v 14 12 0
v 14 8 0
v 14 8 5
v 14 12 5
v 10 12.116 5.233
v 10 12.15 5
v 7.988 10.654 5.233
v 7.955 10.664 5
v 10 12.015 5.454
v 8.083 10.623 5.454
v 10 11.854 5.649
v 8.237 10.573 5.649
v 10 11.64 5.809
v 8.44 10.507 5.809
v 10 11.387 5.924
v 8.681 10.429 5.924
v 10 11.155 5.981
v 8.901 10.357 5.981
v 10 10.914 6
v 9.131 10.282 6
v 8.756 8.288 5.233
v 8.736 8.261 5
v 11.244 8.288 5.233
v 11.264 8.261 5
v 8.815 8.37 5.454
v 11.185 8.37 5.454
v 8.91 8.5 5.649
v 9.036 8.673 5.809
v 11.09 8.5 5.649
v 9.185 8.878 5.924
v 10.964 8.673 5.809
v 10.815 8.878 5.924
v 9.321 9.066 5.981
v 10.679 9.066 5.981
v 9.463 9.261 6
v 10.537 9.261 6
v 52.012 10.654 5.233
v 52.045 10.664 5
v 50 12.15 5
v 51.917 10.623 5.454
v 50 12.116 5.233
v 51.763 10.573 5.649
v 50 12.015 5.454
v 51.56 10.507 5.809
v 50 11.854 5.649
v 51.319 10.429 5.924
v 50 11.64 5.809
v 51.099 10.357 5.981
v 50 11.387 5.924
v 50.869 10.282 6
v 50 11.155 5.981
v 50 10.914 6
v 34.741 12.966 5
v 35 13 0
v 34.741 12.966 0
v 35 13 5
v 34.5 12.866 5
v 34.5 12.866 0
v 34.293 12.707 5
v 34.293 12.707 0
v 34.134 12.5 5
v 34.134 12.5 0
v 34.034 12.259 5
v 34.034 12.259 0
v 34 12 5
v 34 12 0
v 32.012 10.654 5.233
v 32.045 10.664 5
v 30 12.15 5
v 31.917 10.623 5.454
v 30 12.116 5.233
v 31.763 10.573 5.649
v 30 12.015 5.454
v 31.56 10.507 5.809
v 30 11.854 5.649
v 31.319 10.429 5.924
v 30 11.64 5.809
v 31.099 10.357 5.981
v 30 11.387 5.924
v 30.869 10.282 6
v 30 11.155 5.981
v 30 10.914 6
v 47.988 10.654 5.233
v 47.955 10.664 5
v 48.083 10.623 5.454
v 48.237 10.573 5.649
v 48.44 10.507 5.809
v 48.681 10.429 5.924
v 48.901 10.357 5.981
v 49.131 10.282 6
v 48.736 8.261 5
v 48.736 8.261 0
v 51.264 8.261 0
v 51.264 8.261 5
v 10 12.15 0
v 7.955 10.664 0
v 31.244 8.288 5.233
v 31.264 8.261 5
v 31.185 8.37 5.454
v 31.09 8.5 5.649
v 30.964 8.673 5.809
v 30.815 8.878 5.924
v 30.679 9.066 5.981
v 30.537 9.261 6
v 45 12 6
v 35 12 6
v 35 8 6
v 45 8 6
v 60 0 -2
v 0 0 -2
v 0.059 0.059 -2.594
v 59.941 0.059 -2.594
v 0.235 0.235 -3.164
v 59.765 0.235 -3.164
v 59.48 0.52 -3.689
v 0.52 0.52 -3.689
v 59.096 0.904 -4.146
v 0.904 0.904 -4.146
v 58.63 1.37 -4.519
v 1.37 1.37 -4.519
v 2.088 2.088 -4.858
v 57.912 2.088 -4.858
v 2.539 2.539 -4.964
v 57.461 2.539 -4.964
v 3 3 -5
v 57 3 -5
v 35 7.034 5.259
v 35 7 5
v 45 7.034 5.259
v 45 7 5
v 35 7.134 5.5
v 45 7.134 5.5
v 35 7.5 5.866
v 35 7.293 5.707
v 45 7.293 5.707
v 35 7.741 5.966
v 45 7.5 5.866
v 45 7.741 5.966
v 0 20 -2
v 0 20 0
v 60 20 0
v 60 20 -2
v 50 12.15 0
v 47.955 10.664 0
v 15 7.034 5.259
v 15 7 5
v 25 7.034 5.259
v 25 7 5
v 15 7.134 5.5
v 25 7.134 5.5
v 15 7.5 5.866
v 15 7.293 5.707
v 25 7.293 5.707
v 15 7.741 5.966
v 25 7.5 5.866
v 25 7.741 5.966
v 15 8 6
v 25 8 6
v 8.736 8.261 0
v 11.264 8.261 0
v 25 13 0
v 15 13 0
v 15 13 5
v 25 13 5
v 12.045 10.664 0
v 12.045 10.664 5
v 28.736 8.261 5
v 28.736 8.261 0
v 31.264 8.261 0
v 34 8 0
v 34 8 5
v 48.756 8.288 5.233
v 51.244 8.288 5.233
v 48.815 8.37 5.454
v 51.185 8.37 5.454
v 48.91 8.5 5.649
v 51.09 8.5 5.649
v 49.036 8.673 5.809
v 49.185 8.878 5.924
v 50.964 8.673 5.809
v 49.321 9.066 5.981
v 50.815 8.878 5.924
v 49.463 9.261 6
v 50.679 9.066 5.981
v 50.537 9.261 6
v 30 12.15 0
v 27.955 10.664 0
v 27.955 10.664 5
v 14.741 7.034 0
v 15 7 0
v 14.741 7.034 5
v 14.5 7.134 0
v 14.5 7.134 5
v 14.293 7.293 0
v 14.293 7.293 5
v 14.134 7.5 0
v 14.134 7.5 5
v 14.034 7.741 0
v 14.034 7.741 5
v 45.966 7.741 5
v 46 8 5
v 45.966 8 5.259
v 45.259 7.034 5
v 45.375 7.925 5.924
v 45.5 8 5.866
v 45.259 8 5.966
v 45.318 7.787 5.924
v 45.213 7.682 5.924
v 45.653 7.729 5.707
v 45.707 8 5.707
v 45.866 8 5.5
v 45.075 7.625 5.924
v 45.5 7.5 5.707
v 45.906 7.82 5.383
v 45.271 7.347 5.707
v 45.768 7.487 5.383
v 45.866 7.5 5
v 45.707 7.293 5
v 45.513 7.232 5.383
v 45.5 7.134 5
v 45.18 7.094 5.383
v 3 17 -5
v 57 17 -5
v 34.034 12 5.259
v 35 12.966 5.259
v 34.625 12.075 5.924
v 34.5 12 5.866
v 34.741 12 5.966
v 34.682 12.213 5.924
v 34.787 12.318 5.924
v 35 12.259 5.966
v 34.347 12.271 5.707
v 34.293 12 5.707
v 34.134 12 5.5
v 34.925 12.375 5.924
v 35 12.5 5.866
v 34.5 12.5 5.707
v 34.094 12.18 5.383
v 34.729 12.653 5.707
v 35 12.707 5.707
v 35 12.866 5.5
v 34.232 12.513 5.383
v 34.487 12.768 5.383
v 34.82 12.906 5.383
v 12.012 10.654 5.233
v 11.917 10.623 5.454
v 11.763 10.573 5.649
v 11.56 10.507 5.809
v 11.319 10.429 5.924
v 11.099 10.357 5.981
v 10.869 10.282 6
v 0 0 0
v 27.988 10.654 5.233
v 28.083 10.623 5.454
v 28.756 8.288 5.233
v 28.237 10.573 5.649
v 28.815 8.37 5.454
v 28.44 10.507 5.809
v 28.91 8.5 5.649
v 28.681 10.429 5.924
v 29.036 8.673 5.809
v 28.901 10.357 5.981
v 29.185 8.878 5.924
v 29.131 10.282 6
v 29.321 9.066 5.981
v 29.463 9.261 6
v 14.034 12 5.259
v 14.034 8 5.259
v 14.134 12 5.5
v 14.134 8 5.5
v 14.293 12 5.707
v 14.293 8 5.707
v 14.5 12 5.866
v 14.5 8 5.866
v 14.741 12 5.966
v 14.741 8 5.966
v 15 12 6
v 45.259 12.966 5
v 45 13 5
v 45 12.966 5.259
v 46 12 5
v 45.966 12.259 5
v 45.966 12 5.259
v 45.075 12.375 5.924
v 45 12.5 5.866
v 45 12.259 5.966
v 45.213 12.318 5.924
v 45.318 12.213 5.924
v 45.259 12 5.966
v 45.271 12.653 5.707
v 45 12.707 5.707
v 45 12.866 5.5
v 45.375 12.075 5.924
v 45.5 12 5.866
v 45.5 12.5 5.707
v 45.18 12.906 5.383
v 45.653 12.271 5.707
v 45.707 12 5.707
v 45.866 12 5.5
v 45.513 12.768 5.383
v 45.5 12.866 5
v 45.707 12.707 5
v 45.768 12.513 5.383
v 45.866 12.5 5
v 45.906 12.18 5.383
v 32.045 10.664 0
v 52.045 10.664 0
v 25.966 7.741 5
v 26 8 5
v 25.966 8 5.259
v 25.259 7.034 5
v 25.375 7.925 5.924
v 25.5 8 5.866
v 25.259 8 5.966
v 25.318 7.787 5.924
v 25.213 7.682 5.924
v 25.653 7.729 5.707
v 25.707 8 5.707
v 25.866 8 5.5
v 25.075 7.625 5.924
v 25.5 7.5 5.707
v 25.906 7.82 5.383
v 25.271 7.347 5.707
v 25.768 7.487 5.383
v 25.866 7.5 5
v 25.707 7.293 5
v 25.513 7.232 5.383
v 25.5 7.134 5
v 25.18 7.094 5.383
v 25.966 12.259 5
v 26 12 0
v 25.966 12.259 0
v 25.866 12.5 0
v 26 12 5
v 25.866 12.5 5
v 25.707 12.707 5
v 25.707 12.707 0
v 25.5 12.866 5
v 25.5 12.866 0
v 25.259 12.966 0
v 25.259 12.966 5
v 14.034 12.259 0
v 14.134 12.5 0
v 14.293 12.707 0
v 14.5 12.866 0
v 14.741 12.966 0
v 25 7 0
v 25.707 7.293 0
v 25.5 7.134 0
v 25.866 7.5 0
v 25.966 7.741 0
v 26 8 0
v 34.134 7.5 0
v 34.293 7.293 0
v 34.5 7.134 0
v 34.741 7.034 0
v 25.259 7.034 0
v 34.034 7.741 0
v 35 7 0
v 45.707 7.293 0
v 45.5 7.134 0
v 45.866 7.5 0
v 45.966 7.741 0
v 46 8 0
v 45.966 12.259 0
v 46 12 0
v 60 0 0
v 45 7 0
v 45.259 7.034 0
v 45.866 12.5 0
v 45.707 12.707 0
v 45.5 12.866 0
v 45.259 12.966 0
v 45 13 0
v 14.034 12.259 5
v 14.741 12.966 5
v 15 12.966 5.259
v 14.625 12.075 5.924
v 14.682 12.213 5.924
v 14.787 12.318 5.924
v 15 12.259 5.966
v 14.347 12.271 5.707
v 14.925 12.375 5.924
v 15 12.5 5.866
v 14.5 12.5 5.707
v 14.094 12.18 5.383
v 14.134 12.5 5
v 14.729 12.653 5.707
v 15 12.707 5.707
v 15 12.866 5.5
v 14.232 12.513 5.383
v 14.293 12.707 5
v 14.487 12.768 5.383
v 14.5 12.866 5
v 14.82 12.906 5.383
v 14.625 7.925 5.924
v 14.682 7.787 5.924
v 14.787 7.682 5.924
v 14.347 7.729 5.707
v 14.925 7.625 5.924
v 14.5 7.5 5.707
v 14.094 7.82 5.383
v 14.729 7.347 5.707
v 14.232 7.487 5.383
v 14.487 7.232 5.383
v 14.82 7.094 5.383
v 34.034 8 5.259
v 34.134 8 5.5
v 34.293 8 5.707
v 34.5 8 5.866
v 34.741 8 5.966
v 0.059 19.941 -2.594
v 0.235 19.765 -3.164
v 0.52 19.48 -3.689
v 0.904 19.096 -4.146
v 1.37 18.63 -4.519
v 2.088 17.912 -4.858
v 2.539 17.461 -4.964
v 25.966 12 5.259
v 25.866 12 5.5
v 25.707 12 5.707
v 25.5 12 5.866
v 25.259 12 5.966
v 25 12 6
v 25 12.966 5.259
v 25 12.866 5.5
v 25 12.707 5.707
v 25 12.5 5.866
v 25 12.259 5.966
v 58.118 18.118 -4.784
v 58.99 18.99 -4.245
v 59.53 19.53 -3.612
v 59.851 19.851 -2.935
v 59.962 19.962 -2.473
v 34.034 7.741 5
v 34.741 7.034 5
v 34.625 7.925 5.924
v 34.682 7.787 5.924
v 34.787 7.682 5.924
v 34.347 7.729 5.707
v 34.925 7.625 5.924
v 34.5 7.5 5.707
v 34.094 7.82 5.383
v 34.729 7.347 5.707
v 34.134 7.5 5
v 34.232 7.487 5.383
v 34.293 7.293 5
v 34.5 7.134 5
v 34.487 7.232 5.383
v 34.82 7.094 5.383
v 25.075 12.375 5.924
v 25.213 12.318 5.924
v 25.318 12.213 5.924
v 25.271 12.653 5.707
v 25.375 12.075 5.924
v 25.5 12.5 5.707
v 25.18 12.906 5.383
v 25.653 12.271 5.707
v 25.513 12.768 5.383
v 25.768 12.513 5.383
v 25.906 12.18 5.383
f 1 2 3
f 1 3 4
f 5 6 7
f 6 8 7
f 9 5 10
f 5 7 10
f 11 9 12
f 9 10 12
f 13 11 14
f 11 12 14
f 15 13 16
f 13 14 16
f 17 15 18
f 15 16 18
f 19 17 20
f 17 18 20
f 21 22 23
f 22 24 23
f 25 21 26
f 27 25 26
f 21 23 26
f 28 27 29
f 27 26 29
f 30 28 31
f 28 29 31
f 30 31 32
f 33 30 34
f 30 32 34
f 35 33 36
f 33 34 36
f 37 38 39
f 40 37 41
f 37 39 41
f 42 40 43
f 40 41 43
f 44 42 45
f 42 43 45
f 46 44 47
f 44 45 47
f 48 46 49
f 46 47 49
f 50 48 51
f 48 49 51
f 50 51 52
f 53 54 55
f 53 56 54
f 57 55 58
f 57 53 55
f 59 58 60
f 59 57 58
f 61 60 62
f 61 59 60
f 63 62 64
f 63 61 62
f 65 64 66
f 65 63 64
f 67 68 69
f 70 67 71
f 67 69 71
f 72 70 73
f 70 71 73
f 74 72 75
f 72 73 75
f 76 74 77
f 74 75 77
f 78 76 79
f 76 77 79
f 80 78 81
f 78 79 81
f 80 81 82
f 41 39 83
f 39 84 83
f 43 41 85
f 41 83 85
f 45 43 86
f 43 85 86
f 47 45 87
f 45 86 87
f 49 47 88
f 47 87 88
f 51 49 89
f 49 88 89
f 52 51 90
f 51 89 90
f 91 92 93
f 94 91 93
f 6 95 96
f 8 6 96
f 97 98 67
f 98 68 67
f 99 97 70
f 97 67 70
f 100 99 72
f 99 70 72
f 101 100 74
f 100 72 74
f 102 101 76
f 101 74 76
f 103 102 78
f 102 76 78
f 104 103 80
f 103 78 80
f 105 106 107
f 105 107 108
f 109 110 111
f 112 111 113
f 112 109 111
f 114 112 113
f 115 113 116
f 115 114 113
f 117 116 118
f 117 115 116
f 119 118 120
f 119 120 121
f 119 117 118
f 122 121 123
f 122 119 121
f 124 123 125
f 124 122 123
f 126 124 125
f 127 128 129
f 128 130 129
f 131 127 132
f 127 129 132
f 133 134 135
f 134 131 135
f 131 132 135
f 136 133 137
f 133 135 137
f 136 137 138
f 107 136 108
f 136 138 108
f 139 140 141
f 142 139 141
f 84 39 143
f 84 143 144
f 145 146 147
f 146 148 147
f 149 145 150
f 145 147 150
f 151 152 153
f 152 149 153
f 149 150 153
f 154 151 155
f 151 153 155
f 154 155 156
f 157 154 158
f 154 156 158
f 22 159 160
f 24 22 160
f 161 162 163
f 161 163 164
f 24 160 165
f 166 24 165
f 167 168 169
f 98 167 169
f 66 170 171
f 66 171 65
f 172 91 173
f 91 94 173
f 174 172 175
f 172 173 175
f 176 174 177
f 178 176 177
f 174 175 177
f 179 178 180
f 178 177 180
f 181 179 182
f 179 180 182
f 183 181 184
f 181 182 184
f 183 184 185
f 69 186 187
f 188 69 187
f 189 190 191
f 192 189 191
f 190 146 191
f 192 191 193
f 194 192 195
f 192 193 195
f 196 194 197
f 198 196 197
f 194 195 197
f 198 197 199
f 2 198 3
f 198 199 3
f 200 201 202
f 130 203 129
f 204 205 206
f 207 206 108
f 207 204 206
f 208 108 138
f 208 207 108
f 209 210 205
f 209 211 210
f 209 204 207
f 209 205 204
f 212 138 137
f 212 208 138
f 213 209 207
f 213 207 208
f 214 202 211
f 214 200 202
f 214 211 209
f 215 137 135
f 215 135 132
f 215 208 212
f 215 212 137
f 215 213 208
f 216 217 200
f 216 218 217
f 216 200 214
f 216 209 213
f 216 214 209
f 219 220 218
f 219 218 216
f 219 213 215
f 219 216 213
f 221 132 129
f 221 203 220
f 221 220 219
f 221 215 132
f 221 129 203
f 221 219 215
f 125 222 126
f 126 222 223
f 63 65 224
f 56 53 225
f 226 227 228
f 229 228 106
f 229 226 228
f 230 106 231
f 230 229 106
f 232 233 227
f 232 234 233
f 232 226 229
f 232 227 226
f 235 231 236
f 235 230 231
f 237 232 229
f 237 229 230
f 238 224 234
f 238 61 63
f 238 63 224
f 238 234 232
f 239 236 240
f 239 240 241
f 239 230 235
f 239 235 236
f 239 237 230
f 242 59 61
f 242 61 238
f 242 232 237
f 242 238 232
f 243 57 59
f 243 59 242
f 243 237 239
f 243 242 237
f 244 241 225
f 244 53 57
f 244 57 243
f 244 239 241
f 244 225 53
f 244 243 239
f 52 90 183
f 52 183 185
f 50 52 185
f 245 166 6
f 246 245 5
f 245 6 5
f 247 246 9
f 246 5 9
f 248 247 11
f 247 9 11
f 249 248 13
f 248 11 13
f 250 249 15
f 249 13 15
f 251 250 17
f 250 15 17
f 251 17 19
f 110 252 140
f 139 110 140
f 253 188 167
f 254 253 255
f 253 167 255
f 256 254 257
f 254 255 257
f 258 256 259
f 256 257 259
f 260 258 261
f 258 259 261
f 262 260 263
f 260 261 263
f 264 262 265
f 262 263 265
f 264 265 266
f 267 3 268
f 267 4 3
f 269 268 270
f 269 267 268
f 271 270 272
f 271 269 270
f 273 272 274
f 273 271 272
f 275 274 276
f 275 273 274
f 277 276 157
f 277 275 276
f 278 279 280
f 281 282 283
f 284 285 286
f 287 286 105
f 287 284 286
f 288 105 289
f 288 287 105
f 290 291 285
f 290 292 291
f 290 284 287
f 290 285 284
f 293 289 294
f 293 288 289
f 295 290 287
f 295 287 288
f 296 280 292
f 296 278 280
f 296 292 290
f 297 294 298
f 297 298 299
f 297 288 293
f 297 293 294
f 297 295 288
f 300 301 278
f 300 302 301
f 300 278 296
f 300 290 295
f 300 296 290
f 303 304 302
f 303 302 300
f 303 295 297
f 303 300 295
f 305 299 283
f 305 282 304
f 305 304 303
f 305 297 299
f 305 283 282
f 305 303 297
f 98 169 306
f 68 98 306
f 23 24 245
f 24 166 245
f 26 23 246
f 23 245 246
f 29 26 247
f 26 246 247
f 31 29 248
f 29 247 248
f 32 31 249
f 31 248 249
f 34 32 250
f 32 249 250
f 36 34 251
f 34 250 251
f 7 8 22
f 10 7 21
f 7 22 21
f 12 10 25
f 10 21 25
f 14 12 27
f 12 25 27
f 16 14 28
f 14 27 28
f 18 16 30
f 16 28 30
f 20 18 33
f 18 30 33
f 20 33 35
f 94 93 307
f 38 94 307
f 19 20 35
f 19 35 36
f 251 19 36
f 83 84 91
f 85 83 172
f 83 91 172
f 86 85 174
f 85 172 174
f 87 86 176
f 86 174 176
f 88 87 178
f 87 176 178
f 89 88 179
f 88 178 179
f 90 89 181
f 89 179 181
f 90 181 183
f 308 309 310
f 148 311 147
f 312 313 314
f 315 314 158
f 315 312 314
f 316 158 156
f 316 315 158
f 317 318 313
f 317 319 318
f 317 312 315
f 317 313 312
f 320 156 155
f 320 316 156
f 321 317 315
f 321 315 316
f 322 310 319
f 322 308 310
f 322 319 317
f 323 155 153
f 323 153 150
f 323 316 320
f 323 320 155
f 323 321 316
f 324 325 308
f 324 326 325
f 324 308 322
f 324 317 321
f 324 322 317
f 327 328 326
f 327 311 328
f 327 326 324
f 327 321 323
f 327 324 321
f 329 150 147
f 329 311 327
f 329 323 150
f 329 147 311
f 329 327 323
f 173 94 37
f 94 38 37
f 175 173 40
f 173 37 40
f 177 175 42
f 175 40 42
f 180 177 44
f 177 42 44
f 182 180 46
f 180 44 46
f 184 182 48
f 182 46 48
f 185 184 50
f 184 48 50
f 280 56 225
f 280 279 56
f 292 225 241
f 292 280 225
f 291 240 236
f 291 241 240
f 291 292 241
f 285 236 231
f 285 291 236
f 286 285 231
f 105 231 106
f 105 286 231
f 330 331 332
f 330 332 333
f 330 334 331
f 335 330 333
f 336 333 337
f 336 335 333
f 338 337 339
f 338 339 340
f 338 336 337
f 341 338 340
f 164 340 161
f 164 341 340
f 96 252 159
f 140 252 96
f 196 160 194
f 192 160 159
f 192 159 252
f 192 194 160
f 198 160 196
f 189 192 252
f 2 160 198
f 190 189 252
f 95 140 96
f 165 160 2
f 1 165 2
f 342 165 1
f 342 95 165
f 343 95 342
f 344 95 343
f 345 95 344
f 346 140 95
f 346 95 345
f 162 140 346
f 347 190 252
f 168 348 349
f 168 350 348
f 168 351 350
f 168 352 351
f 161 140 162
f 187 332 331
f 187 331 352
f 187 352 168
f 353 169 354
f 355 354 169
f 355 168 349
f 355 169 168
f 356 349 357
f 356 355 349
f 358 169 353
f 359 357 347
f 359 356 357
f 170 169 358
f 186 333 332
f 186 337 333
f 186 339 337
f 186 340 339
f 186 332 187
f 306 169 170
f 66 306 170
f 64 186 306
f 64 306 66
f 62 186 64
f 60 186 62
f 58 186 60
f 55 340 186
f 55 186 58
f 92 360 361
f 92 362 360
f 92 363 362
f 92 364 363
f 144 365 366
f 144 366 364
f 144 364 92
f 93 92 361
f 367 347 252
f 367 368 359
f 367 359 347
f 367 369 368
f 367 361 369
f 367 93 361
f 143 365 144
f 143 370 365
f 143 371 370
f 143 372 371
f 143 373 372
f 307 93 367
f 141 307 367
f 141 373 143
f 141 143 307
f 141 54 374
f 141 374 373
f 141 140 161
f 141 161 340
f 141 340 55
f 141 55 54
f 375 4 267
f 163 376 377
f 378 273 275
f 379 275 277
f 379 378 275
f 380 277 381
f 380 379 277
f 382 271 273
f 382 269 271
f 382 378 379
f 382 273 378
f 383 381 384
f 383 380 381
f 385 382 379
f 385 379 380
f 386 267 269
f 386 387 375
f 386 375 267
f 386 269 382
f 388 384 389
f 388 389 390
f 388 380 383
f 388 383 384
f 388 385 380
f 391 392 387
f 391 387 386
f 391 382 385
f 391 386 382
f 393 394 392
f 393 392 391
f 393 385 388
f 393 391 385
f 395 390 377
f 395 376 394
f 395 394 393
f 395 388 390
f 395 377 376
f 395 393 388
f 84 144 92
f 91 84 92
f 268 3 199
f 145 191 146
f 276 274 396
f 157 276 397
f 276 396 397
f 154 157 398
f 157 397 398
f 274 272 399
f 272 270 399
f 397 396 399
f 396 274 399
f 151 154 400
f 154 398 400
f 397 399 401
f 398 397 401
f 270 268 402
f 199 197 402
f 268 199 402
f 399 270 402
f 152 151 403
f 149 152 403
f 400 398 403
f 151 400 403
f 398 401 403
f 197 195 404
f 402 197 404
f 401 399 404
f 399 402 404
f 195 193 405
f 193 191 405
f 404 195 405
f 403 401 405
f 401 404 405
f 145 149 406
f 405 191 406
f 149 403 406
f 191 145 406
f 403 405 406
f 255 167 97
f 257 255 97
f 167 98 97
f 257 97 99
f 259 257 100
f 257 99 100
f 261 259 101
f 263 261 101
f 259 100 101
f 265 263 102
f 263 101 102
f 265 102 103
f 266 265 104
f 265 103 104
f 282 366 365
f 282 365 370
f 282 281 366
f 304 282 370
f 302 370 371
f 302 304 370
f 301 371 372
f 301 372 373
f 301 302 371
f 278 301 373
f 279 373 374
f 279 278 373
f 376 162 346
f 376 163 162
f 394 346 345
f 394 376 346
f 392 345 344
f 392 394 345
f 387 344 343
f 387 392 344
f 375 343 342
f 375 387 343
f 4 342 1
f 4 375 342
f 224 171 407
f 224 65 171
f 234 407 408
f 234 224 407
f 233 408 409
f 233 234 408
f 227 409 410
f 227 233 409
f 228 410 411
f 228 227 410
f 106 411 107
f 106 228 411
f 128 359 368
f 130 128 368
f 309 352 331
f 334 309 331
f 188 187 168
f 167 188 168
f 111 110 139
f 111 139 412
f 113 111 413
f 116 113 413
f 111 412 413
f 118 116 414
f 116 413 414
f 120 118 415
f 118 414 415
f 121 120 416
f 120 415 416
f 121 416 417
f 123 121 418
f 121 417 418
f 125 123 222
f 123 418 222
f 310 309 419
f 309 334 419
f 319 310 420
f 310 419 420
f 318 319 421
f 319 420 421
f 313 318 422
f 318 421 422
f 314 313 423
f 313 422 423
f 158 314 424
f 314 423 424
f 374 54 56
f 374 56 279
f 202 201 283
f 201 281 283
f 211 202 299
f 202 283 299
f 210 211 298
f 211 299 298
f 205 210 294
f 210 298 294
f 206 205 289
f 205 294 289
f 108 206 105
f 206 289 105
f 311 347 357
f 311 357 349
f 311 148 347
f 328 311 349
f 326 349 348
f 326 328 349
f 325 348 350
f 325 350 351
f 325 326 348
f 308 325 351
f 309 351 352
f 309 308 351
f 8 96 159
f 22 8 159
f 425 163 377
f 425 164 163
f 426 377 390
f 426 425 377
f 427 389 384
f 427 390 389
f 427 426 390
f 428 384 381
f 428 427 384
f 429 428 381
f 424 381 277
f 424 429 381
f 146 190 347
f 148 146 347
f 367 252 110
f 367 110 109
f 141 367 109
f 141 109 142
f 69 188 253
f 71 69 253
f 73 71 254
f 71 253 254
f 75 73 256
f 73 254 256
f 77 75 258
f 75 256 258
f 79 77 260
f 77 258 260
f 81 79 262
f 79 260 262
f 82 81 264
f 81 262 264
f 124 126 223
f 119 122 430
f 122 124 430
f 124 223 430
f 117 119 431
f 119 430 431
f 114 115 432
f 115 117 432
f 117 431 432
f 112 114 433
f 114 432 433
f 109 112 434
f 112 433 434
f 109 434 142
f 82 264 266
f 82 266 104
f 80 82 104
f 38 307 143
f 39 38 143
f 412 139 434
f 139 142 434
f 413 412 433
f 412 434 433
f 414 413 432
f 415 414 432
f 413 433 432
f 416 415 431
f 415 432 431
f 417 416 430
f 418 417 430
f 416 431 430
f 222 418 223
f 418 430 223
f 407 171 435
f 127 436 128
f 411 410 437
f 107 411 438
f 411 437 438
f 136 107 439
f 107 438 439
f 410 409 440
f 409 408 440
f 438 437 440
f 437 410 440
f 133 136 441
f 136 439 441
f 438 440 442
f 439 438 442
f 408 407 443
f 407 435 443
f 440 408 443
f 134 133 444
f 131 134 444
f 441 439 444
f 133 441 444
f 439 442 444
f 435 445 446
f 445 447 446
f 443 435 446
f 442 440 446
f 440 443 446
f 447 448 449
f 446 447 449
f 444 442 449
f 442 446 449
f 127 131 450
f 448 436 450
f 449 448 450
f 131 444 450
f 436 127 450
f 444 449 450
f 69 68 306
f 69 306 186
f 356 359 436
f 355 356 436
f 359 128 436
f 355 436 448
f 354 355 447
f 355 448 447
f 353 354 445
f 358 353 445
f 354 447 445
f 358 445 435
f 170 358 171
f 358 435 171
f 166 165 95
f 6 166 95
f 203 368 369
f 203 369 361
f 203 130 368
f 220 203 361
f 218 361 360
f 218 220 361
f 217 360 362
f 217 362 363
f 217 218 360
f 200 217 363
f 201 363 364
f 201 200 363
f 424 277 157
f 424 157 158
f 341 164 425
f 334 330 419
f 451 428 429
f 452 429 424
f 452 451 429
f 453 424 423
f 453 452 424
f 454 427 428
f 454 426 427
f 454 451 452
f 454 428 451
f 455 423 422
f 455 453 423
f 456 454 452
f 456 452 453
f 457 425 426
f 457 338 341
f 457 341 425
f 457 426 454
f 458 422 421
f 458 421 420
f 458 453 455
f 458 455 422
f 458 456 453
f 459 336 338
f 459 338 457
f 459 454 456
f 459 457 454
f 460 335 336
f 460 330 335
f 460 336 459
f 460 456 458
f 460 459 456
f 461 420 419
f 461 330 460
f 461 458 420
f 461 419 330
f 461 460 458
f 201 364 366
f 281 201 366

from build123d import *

# Parameters (mm, degrees)
F0_W     = 60
F0_H     = 20
F2_DEPTH = 5
F1_W     = 12
F1_H     = 6
F3_DEPTH = 6
F4_R     = 3
F5_R     = 1


with BuildPart() as f2:
    # F0 (on Top) → F2 (new body)
    with BuildSketch(Plane.XY):
        with Locations((30, 10)):
            Rectangle(F0_W, F0_H)
    extrude(amount=-F2_DEPTH)

    # F1 (on face) → F3 (join)
    with BuildSketch(Plane.XY):
        Polygon((8.736262, 8.260613), (11.263738, 8.260613), (12.044772, 10.664387), (10, 12.15), (7.955228, 10.664387), align=None)
        Polygon((30, 12.15), (27.955228, 10.664387), (28.736262, 8.260613), (31.263738, 8.260613), (32.044772, 10.664387), align=None)
        Polygon((50, 12.15), (47.955228, 10.664387), (48.736262, 8.260613), (51.263738, 8.260613), (52.044772, 10.664387), align=None)
        with Locations((20, 10)):
            Rectangle(F1_W, F1_H)
        with Locations((40, 10)):
            Rectangle(F1_W, F1_H)
    extrude(amount=F3_DEPTH)

    # F4
    f4_edges = [f2.edges().sort_by_distance(p)[0] for p in [
        (0, 10, -5),
        (30, 0, -5),
        (60, 10, -5),
        (30, 20, -5),
    ]]
    fillet(f4_edges, radius=F4_R)

    # F5
    f5_edges = [f2.edges().sort_by_distance(p)[0] for p in [
        (8.977614, 11.407193, 6),
        (8.345745, 9.4625, 6),
        (10, 8.260613, 6),
        (11.654255, 9.4625, 6),
        (11.022386, 11.407193, 6),
        (28.977614, 11.407193, 6),
        (28.345745, 9.4625, 6),
        (30, 8.260613, 6),
        (31.654255, 9.4625, 6),
        (31.022386, 11.407193, 6),
        (51.654255, 9.4625, 6),
        (50, 8.260613, 6),
        (48.345745, 9.4625, 6),
        (48.977614, 11.407193, 6),
        (51.022386, 11.407193, 6),
        (14, 7, 3),
        (26, 7, 3),
        (26, 13, 3),
        (14, 13, 3),
        (34, 13, 3),
        (34, 7, 3),
        (46, 13, 3),
        (46, 7, 3),
        (14, 10, 6),
        (20, 13, 6),
        (26, 10, 6),
        (20, 7, 6),
        (34, 10, 6),
        (40, 13, 6),
        (46, 10, 6),
        (40, 7, 6),
    ]]
    fillet(f5_edges, radius=F5_R)


solid = f2.part
